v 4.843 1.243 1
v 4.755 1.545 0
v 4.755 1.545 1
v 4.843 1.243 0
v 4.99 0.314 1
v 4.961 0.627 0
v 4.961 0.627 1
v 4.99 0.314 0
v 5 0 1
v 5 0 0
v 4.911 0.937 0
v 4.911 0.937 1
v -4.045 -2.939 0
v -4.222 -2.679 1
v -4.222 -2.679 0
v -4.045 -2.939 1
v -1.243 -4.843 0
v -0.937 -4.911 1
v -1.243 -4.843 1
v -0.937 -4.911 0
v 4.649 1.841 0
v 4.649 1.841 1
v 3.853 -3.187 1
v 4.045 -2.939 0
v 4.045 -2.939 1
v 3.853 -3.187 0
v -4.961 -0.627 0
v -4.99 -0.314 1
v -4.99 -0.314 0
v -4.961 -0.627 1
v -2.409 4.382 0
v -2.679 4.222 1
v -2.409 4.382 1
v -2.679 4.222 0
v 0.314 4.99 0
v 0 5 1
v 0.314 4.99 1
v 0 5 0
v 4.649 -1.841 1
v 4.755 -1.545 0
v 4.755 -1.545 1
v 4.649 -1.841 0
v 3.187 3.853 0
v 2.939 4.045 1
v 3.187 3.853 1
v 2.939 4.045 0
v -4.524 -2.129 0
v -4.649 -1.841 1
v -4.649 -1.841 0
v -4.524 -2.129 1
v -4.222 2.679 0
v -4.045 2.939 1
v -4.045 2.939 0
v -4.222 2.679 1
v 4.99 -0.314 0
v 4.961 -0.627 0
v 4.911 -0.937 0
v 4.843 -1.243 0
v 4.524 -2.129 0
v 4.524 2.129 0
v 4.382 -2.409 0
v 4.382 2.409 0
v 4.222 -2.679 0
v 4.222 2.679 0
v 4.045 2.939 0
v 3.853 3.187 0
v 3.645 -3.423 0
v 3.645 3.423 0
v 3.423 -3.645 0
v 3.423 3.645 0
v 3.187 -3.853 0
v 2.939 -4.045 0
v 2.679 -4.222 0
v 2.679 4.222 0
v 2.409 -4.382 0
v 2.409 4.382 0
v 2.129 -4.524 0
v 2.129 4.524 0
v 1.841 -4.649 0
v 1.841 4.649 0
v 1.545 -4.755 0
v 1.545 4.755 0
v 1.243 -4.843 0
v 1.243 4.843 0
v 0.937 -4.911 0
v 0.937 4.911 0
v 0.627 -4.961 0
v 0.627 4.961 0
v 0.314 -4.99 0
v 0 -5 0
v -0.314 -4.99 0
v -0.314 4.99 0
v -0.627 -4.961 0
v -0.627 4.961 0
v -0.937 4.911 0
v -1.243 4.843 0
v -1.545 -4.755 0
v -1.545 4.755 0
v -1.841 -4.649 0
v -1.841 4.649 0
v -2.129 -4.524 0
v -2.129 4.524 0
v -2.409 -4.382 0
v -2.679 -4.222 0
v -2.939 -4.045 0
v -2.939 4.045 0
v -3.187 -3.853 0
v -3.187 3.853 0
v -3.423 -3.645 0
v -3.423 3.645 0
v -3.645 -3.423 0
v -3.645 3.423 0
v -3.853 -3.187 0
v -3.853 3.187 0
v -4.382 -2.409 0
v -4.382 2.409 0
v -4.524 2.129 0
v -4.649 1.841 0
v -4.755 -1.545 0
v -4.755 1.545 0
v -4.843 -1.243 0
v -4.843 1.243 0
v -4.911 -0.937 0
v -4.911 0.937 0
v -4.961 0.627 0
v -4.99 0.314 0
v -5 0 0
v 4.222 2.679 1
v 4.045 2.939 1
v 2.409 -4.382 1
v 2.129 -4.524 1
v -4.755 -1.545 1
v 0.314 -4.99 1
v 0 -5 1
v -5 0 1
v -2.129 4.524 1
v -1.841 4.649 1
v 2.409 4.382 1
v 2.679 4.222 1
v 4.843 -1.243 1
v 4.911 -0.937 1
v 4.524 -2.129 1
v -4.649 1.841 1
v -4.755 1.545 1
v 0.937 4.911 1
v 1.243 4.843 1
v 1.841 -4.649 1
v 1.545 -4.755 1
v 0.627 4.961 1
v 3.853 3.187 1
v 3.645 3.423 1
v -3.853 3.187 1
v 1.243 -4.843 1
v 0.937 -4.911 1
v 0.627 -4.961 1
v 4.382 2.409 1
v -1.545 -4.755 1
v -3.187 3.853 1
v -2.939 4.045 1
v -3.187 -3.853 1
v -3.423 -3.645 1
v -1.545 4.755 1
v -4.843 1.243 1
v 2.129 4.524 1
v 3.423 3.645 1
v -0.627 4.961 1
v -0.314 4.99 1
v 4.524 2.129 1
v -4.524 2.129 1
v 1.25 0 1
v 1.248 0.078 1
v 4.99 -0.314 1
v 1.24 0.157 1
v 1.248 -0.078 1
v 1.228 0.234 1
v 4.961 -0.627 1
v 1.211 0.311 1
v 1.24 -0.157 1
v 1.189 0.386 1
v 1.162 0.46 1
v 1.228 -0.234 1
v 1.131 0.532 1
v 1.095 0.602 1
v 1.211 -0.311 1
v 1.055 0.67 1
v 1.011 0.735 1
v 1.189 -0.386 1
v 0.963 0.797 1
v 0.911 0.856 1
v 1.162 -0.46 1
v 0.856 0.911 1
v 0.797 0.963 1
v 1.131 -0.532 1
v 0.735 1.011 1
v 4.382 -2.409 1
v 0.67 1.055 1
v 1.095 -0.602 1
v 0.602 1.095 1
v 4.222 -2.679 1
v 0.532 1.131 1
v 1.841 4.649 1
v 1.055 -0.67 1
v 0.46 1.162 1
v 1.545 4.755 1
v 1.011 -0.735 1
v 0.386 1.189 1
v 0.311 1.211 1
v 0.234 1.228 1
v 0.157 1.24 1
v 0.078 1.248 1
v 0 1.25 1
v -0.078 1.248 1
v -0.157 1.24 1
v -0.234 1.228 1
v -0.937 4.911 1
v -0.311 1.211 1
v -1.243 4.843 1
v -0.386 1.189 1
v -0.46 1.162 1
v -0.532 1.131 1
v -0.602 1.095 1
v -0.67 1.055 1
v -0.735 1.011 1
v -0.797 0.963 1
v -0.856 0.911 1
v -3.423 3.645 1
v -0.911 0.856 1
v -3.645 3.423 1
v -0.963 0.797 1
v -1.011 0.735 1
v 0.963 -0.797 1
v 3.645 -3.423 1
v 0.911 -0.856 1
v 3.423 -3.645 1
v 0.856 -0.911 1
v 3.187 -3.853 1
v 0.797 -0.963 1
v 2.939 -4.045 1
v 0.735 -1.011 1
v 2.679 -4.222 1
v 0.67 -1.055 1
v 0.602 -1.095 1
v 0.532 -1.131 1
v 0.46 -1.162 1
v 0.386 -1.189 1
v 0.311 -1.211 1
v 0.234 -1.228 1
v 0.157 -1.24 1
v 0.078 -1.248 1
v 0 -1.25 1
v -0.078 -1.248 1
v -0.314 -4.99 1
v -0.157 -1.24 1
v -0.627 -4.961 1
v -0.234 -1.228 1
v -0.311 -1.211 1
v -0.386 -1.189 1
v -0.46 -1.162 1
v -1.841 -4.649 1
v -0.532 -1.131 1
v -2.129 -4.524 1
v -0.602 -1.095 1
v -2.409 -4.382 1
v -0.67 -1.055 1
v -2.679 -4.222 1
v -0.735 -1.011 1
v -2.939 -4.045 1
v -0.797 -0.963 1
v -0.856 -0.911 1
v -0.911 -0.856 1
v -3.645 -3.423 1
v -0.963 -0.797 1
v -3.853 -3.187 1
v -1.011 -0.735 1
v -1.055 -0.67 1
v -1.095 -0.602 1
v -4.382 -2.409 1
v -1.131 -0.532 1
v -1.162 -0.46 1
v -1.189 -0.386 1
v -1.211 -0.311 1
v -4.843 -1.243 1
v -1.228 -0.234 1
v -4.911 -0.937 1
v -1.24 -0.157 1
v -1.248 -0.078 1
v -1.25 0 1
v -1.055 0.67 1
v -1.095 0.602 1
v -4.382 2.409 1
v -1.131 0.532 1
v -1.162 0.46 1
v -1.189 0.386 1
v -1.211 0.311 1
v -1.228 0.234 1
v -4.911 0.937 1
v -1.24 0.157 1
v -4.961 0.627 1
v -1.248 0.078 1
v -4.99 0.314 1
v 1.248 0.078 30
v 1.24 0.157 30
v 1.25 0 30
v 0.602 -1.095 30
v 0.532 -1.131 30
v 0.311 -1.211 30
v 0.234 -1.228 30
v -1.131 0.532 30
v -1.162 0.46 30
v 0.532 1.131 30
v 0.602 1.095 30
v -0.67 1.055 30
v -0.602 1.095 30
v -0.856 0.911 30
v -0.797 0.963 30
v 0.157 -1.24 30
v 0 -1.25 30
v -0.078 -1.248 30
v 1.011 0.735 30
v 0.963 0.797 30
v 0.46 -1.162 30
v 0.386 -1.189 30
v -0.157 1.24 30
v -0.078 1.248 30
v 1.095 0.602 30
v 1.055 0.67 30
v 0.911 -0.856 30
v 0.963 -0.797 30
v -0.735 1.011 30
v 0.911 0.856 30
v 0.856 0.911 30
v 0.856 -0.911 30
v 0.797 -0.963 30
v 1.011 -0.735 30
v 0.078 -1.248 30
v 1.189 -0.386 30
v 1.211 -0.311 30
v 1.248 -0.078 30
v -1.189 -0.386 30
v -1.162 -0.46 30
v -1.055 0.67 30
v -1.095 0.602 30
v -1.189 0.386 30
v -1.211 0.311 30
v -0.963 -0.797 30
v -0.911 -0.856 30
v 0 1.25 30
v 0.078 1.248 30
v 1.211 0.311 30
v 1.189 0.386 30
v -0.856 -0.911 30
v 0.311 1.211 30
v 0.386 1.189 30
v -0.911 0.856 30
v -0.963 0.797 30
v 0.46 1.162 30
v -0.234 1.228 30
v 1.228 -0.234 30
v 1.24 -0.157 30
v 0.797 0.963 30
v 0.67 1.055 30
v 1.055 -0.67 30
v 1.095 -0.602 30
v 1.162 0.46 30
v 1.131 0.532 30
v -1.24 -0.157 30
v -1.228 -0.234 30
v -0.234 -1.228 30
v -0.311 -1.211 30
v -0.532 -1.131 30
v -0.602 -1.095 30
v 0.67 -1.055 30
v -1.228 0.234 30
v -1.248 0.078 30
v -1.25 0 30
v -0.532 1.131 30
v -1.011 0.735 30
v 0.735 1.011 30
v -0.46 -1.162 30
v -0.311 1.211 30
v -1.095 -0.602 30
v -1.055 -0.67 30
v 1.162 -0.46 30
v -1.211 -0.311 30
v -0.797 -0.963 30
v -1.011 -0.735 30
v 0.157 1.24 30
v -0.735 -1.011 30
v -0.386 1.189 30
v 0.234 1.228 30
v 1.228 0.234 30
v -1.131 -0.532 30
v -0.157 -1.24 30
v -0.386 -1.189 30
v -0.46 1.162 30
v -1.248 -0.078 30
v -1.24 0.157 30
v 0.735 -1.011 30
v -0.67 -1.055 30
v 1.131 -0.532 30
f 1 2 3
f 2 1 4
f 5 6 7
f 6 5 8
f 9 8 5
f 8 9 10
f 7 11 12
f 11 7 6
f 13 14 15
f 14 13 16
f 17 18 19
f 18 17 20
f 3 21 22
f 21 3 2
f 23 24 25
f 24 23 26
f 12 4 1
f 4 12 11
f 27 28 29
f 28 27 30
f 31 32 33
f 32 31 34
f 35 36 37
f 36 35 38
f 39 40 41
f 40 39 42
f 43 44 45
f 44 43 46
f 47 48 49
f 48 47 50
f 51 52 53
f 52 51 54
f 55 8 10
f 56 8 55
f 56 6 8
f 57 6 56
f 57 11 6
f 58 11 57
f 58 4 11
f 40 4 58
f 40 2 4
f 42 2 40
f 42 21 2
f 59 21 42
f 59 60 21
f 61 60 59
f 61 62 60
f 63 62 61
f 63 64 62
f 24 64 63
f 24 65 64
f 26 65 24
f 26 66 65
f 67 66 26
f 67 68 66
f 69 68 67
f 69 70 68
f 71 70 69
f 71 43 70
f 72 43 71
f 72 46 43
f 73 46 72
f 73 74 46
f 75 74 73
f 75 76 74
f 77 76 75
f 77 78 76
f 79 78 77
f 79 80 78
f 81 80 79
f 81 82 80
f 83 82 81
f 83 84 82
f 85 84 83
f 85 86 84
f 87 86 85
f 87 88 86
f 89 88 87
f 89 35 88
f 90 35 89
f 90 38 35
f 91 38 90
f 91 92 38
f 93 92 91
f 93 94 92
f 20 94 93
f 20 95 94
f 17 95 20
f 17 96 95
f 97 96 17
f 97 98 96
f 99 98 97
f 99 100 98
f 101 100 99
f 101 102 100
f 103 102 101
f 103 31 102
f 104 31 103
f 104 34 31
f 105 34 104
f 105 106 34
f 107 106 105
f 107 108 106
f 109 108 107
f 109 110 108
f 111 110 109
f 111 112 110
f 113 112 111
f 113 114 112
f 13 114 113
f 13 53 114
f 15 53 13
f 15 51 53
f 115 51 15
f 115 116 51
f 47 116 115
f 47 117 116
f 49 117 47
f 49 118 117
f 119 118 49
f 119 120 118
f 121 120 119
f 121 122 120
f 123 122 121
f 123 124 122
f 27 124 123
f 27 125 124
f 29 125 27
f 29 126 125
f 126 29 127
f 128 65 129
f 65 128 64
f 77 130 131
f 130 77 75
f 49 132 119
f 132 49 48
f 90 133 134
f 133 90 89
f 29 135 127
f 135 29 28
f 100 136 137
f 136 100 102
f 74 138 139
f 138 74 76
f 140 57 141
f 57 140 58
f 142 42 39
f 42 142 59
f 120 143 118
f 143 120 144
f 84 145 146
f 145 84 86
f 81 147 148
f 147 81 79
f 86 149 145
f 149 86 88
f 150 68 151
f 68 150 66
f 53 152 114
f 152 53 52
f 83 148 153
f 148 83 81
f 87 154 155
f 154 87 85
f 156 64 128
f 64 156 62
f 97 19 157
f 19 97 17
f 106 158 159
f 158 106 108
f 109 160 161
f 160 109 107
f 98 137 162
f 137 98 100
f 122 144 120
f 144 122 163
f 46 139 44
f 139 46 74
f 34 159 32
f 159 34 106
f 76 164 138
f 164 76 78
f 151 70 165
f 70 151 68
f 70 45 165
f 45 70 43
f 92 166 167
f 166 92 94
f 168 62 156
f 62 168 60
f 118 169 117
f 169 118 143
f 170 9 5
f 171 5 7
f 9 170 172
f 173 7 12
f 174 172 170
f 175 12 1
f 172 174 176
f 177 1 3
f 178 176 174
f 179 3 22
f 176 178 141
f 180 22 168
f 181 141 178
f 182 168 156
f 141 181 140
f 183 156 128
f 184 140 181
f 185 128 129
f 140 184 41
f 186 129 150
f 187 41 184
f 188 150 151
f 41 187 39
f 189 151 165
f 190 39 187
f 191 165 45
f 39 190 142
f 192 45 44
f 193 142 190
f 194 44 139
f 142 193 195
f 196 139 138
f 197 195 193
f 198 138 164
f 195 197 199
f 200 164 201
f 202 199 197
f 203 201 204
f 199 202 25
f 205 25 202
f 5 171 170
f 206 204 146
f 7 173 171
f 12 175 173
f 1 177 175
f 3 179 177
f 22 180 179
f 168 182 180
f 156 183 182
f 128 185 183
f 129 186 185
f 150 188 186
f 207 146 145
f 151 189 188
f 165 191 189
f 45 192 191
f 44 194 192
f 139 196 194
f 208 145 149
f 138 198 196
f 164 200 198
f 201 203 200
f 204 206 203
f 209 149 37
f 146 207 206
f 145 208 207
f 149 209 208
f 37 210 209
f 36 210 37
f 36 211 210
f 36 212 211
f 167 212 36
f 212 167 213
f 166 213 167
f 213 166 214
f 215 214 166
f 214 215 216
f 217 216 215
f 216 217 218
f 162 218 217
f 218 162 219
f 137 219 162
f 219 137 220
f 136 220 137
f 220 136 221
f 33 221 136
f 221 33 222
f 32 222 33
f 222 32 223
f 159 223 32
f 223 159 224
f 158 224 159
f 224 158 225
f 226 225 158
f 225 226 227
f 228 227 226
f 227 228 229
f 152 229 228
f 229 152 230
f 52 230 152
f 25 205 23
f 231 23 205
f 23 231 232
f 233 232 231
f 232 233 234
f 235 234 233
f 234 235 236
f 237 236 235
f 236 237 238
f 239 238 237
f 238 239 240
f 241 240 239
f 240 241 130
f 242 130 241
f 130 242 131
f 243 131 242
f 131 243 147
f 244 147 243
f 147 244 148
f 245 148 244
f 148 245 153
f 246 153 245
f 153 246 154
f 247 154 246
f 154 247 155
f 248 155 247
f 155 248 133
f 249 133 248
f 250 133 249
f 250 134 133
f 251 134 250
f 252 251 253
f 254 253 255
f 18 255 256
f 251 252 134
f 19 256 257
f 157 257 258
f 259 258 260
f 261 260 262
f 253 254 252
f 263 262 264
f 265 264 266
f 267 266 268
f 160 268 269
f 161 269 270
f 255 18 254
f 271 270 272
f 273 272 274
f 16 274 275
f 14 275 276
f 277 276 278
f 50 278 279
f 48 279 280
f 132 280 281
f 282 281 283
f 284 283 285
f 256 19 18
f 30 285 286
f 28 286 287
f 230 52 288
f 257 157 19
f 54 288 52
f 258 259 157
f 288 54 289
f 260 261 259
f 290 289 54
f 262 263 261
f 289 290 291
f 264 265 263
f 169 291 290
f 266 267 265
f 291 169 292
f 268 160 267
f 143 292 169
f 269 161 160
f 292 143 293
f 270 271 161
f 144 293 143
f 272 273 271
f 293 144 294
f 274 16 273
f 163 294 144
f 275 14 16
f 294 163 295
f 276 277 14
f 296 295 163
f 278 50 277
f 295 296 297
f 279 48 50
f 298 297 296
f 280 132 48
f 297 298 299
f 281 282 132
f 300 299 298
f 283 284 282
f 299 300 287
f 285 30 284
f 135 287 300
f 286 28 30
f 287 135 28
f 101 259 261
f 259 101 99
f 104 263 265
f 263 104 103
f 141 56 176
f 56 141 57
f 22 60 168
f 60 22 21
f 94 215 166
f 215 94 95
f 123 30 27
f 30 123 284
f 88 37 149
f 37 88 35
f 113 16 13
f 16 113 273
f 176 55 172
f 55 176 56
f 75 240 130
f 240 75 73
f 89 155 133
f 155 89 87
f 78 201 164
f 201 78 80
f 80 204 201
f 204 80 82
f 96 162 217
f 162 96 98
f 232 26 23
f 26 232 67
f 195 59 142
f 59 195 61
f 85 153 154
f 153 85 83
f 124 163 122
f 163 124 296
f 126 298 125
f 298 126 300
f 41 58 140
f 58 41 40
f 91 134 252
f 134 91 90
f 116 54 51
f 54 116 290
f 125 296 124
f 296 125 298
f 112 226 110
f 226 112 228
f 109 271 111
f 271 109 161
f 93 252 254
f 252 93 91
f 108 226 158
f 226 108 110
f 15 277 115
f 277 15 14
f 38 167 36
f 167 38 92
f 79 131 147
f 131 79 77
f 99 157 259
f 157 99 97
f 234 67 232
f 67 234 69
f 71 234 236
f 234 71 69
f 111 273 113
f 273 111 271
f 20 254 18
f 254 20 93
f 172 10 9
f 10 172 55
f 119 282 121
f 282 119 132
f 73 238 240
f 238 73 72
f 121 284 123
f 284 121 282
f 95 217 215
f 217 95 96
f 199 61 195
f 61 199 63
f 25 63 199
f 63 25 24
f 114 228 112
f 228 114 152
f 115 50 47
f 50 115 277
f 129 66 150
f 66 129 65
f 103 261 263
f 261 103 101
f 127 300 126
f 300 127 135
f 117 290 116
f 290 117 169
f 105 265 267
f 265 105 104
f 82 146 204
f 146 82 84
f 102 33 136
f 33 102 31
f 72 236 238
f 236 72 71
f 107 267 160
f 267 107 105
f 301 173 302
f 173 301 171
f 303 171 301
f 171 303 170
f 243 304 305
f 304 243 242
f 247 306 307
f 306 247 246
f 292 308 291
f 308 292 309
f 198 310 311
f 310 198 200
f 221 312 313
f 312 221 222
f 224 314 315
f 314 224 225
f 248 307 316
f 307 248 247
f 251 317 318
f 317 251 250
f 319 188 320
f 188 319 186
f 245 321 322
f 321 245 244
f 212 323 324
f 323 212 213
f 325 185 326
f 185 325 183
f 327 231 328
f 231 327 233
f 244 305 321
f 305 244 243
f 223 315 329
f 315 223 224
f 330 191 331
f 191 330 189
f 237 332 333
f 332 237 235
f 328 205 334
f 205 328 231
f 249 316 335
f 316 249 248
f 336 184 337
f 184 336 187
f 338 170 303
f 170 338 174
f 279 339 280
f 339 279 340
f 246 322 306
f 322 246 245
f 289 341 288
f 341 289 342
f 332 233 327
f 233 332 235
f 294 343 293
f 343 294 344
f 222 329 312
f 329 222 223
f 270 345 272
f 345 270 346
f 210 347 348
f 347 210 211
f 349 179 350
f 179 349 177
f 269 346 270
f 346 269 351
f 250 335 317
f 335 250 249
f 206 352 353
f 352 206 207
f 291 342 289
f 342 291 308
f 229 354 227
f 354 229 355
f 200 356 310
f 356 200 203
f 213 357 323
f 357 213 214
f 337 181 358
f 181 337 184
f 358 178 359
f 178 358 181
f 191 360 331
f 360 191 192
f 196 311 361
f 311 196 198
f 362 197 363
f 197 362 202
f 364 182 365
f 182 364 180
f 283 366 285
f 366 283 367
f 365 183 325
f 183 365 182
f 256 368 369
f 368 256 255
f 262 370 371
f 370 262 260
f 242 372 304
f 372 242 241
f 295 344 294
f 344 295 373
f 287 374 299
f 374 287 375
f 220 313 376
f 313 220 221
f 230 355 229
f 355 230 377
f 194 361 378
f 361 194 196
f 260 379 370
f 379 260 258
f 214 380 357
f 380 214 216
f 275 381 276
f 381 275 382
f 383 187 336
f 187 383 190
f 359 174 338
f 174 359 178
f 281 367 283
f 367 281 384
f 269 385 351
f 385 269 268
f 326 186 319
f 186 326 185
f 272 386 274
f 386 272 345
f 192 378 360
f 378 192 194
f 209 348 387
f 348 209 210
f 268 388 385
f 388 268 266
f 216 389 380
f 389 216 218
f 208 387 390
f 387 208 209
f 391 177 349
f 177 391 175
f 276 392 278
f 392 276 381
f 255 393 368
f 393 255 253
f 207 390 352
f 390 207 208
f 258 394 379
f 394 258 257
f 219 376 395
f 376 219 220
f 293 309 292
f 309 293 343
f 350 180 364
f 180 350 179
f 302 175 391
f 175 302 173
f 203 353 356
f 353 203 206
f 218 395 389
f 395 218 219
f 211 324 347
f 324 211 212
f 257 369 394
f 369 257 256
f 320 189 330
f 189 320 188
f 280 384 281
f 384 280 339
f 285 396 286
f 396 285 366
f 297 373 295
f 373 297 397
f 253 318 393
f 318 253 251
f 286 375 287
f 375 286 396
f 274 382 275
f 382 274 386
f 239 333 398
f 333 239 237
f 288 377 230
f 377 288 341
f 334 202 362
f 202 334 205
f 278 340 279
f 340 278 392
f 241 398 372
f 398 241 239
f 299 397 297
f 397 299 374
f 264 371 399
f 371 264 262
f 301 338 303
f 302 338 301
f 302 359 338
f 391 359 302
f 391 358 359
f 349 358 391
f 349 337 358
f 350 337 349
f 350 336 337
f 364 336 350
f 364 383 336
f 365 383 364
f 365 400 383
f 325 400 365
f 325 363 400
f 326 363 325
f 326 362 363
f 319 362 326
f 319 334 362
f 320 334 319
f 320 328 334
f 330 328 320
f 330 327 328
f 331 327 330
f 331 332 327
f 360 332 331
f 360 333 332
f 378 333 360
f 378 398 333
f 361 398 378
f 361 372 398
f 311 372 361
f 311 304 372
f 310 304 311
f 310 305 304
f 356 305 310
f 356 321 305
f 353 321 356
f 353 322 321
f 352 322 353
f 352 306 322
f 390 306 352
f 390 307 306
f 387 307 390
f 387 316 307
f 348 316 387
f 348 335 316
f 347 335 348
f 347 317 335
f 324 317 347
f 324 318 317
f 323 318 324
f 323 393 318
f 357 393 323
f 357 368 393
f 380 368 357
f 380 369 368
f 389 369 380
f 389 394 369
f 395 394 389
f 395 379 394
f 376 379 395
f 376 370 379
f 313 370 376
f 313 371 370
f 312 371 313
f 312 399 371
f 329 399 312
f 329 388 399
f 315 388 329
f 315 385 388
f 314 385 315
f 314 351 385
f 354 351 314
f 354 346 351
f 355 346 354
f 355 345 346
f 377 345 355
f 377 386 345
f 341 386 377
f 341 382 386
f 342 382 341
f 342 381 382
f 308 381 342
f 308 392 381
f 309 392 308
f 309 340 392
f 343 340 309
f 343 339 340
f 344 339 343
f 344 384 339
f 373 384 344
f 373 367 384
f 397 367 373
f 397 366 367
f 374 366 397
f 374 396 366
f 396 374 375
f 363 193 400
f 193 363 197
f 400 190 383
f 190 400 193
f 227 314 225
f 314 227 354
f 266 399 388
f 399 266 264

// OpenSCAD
$fn = 100;

module guide() {
    difference() {
        translate([-45,-50,0])
        linear_extrude(height = 15, center = true)
        import("thread_cutter_1.dxf", layer="layer_3_FLATTENED");
    
        translate([-45,0,5])
        #cube([20,200,15], center = true);

        translate([45,0,5])
        #cube([20,200,15], center = true);

        #cube([60,200,5], center = true);
    }
}

//guide();

module slider() {

    intersection() {
        translate([-35,-90,0])
        linear_extrude(height = 4, center = true)
        import("thread_cutter_2.dxf", layer="layer_2_FLATTENED");

        #cube([59,200,100], center = true);
    }
}

//slider(); 

module pin() {
    cylinder(d = 10, h = 1);
    cylinder(d = 2.5, h = 30);
}

pin();

module pincap() {
    difference() {
        cylinder(d = 6, h = 20);
        
        translate([0,0,-10])
        cylinder(d = 2.7, h = 100);
    }
}

//pincap();

gripper_exterior_radius = 10;
gripper_interior_radius = 3;

module gripper_exterior() {
    difference() {
        union() {
            cylinder(r = gripper_exterior_radius, h = 15, center = true);
        
            num_treads = floor(2 * PI * gripper_exterior_radius / 2);
            for (i = [0:num_treads]) {
                rotate([0,0,i*(360/num_treads)])
                translate([gripper_exterior_radius,0,0])
                cylinder(d = 1, h = 14, center = true);
            }
        }

        cylinder(r = gripper_exterior_radius-1, h = 100, center = true);
    }
}

module gripper_spoke() {
    intersection() {
        cylinder(r = gripper_exterior_radius-0.5, h = 100, center = true);
        
        translate([0,50,0])
        cube([100,100,100], center = true);
        
        translate([gripper_exterior_radius-gripper_interior_radius-1,0,0])
        difference() {
            cylinder(r = gripper_exterior_radius, h = 15, center = true);
            cylinder(r = gripper_exterior_radius-0.5, h = 100, center = true);
        }
    }
}

module gripper_spokes() {
    num_spokes = 6;
    for (i = [0:num_spokes]) {
        rotate([0,0,i*(360/num_spokes)])
        gripper_spoke();
    }
}

module gripper_interior() {
    cylinder(r = gripper_interior_radius+1, h = 15, center = true);
}

module gripper() {
    difference() {
        union() {
            gripper_exterior();
            gripper_spokes();
            gripper_interior();
        }
        cylinder(d = 6, h = 100, center = true);
    }
}

//gripper();
